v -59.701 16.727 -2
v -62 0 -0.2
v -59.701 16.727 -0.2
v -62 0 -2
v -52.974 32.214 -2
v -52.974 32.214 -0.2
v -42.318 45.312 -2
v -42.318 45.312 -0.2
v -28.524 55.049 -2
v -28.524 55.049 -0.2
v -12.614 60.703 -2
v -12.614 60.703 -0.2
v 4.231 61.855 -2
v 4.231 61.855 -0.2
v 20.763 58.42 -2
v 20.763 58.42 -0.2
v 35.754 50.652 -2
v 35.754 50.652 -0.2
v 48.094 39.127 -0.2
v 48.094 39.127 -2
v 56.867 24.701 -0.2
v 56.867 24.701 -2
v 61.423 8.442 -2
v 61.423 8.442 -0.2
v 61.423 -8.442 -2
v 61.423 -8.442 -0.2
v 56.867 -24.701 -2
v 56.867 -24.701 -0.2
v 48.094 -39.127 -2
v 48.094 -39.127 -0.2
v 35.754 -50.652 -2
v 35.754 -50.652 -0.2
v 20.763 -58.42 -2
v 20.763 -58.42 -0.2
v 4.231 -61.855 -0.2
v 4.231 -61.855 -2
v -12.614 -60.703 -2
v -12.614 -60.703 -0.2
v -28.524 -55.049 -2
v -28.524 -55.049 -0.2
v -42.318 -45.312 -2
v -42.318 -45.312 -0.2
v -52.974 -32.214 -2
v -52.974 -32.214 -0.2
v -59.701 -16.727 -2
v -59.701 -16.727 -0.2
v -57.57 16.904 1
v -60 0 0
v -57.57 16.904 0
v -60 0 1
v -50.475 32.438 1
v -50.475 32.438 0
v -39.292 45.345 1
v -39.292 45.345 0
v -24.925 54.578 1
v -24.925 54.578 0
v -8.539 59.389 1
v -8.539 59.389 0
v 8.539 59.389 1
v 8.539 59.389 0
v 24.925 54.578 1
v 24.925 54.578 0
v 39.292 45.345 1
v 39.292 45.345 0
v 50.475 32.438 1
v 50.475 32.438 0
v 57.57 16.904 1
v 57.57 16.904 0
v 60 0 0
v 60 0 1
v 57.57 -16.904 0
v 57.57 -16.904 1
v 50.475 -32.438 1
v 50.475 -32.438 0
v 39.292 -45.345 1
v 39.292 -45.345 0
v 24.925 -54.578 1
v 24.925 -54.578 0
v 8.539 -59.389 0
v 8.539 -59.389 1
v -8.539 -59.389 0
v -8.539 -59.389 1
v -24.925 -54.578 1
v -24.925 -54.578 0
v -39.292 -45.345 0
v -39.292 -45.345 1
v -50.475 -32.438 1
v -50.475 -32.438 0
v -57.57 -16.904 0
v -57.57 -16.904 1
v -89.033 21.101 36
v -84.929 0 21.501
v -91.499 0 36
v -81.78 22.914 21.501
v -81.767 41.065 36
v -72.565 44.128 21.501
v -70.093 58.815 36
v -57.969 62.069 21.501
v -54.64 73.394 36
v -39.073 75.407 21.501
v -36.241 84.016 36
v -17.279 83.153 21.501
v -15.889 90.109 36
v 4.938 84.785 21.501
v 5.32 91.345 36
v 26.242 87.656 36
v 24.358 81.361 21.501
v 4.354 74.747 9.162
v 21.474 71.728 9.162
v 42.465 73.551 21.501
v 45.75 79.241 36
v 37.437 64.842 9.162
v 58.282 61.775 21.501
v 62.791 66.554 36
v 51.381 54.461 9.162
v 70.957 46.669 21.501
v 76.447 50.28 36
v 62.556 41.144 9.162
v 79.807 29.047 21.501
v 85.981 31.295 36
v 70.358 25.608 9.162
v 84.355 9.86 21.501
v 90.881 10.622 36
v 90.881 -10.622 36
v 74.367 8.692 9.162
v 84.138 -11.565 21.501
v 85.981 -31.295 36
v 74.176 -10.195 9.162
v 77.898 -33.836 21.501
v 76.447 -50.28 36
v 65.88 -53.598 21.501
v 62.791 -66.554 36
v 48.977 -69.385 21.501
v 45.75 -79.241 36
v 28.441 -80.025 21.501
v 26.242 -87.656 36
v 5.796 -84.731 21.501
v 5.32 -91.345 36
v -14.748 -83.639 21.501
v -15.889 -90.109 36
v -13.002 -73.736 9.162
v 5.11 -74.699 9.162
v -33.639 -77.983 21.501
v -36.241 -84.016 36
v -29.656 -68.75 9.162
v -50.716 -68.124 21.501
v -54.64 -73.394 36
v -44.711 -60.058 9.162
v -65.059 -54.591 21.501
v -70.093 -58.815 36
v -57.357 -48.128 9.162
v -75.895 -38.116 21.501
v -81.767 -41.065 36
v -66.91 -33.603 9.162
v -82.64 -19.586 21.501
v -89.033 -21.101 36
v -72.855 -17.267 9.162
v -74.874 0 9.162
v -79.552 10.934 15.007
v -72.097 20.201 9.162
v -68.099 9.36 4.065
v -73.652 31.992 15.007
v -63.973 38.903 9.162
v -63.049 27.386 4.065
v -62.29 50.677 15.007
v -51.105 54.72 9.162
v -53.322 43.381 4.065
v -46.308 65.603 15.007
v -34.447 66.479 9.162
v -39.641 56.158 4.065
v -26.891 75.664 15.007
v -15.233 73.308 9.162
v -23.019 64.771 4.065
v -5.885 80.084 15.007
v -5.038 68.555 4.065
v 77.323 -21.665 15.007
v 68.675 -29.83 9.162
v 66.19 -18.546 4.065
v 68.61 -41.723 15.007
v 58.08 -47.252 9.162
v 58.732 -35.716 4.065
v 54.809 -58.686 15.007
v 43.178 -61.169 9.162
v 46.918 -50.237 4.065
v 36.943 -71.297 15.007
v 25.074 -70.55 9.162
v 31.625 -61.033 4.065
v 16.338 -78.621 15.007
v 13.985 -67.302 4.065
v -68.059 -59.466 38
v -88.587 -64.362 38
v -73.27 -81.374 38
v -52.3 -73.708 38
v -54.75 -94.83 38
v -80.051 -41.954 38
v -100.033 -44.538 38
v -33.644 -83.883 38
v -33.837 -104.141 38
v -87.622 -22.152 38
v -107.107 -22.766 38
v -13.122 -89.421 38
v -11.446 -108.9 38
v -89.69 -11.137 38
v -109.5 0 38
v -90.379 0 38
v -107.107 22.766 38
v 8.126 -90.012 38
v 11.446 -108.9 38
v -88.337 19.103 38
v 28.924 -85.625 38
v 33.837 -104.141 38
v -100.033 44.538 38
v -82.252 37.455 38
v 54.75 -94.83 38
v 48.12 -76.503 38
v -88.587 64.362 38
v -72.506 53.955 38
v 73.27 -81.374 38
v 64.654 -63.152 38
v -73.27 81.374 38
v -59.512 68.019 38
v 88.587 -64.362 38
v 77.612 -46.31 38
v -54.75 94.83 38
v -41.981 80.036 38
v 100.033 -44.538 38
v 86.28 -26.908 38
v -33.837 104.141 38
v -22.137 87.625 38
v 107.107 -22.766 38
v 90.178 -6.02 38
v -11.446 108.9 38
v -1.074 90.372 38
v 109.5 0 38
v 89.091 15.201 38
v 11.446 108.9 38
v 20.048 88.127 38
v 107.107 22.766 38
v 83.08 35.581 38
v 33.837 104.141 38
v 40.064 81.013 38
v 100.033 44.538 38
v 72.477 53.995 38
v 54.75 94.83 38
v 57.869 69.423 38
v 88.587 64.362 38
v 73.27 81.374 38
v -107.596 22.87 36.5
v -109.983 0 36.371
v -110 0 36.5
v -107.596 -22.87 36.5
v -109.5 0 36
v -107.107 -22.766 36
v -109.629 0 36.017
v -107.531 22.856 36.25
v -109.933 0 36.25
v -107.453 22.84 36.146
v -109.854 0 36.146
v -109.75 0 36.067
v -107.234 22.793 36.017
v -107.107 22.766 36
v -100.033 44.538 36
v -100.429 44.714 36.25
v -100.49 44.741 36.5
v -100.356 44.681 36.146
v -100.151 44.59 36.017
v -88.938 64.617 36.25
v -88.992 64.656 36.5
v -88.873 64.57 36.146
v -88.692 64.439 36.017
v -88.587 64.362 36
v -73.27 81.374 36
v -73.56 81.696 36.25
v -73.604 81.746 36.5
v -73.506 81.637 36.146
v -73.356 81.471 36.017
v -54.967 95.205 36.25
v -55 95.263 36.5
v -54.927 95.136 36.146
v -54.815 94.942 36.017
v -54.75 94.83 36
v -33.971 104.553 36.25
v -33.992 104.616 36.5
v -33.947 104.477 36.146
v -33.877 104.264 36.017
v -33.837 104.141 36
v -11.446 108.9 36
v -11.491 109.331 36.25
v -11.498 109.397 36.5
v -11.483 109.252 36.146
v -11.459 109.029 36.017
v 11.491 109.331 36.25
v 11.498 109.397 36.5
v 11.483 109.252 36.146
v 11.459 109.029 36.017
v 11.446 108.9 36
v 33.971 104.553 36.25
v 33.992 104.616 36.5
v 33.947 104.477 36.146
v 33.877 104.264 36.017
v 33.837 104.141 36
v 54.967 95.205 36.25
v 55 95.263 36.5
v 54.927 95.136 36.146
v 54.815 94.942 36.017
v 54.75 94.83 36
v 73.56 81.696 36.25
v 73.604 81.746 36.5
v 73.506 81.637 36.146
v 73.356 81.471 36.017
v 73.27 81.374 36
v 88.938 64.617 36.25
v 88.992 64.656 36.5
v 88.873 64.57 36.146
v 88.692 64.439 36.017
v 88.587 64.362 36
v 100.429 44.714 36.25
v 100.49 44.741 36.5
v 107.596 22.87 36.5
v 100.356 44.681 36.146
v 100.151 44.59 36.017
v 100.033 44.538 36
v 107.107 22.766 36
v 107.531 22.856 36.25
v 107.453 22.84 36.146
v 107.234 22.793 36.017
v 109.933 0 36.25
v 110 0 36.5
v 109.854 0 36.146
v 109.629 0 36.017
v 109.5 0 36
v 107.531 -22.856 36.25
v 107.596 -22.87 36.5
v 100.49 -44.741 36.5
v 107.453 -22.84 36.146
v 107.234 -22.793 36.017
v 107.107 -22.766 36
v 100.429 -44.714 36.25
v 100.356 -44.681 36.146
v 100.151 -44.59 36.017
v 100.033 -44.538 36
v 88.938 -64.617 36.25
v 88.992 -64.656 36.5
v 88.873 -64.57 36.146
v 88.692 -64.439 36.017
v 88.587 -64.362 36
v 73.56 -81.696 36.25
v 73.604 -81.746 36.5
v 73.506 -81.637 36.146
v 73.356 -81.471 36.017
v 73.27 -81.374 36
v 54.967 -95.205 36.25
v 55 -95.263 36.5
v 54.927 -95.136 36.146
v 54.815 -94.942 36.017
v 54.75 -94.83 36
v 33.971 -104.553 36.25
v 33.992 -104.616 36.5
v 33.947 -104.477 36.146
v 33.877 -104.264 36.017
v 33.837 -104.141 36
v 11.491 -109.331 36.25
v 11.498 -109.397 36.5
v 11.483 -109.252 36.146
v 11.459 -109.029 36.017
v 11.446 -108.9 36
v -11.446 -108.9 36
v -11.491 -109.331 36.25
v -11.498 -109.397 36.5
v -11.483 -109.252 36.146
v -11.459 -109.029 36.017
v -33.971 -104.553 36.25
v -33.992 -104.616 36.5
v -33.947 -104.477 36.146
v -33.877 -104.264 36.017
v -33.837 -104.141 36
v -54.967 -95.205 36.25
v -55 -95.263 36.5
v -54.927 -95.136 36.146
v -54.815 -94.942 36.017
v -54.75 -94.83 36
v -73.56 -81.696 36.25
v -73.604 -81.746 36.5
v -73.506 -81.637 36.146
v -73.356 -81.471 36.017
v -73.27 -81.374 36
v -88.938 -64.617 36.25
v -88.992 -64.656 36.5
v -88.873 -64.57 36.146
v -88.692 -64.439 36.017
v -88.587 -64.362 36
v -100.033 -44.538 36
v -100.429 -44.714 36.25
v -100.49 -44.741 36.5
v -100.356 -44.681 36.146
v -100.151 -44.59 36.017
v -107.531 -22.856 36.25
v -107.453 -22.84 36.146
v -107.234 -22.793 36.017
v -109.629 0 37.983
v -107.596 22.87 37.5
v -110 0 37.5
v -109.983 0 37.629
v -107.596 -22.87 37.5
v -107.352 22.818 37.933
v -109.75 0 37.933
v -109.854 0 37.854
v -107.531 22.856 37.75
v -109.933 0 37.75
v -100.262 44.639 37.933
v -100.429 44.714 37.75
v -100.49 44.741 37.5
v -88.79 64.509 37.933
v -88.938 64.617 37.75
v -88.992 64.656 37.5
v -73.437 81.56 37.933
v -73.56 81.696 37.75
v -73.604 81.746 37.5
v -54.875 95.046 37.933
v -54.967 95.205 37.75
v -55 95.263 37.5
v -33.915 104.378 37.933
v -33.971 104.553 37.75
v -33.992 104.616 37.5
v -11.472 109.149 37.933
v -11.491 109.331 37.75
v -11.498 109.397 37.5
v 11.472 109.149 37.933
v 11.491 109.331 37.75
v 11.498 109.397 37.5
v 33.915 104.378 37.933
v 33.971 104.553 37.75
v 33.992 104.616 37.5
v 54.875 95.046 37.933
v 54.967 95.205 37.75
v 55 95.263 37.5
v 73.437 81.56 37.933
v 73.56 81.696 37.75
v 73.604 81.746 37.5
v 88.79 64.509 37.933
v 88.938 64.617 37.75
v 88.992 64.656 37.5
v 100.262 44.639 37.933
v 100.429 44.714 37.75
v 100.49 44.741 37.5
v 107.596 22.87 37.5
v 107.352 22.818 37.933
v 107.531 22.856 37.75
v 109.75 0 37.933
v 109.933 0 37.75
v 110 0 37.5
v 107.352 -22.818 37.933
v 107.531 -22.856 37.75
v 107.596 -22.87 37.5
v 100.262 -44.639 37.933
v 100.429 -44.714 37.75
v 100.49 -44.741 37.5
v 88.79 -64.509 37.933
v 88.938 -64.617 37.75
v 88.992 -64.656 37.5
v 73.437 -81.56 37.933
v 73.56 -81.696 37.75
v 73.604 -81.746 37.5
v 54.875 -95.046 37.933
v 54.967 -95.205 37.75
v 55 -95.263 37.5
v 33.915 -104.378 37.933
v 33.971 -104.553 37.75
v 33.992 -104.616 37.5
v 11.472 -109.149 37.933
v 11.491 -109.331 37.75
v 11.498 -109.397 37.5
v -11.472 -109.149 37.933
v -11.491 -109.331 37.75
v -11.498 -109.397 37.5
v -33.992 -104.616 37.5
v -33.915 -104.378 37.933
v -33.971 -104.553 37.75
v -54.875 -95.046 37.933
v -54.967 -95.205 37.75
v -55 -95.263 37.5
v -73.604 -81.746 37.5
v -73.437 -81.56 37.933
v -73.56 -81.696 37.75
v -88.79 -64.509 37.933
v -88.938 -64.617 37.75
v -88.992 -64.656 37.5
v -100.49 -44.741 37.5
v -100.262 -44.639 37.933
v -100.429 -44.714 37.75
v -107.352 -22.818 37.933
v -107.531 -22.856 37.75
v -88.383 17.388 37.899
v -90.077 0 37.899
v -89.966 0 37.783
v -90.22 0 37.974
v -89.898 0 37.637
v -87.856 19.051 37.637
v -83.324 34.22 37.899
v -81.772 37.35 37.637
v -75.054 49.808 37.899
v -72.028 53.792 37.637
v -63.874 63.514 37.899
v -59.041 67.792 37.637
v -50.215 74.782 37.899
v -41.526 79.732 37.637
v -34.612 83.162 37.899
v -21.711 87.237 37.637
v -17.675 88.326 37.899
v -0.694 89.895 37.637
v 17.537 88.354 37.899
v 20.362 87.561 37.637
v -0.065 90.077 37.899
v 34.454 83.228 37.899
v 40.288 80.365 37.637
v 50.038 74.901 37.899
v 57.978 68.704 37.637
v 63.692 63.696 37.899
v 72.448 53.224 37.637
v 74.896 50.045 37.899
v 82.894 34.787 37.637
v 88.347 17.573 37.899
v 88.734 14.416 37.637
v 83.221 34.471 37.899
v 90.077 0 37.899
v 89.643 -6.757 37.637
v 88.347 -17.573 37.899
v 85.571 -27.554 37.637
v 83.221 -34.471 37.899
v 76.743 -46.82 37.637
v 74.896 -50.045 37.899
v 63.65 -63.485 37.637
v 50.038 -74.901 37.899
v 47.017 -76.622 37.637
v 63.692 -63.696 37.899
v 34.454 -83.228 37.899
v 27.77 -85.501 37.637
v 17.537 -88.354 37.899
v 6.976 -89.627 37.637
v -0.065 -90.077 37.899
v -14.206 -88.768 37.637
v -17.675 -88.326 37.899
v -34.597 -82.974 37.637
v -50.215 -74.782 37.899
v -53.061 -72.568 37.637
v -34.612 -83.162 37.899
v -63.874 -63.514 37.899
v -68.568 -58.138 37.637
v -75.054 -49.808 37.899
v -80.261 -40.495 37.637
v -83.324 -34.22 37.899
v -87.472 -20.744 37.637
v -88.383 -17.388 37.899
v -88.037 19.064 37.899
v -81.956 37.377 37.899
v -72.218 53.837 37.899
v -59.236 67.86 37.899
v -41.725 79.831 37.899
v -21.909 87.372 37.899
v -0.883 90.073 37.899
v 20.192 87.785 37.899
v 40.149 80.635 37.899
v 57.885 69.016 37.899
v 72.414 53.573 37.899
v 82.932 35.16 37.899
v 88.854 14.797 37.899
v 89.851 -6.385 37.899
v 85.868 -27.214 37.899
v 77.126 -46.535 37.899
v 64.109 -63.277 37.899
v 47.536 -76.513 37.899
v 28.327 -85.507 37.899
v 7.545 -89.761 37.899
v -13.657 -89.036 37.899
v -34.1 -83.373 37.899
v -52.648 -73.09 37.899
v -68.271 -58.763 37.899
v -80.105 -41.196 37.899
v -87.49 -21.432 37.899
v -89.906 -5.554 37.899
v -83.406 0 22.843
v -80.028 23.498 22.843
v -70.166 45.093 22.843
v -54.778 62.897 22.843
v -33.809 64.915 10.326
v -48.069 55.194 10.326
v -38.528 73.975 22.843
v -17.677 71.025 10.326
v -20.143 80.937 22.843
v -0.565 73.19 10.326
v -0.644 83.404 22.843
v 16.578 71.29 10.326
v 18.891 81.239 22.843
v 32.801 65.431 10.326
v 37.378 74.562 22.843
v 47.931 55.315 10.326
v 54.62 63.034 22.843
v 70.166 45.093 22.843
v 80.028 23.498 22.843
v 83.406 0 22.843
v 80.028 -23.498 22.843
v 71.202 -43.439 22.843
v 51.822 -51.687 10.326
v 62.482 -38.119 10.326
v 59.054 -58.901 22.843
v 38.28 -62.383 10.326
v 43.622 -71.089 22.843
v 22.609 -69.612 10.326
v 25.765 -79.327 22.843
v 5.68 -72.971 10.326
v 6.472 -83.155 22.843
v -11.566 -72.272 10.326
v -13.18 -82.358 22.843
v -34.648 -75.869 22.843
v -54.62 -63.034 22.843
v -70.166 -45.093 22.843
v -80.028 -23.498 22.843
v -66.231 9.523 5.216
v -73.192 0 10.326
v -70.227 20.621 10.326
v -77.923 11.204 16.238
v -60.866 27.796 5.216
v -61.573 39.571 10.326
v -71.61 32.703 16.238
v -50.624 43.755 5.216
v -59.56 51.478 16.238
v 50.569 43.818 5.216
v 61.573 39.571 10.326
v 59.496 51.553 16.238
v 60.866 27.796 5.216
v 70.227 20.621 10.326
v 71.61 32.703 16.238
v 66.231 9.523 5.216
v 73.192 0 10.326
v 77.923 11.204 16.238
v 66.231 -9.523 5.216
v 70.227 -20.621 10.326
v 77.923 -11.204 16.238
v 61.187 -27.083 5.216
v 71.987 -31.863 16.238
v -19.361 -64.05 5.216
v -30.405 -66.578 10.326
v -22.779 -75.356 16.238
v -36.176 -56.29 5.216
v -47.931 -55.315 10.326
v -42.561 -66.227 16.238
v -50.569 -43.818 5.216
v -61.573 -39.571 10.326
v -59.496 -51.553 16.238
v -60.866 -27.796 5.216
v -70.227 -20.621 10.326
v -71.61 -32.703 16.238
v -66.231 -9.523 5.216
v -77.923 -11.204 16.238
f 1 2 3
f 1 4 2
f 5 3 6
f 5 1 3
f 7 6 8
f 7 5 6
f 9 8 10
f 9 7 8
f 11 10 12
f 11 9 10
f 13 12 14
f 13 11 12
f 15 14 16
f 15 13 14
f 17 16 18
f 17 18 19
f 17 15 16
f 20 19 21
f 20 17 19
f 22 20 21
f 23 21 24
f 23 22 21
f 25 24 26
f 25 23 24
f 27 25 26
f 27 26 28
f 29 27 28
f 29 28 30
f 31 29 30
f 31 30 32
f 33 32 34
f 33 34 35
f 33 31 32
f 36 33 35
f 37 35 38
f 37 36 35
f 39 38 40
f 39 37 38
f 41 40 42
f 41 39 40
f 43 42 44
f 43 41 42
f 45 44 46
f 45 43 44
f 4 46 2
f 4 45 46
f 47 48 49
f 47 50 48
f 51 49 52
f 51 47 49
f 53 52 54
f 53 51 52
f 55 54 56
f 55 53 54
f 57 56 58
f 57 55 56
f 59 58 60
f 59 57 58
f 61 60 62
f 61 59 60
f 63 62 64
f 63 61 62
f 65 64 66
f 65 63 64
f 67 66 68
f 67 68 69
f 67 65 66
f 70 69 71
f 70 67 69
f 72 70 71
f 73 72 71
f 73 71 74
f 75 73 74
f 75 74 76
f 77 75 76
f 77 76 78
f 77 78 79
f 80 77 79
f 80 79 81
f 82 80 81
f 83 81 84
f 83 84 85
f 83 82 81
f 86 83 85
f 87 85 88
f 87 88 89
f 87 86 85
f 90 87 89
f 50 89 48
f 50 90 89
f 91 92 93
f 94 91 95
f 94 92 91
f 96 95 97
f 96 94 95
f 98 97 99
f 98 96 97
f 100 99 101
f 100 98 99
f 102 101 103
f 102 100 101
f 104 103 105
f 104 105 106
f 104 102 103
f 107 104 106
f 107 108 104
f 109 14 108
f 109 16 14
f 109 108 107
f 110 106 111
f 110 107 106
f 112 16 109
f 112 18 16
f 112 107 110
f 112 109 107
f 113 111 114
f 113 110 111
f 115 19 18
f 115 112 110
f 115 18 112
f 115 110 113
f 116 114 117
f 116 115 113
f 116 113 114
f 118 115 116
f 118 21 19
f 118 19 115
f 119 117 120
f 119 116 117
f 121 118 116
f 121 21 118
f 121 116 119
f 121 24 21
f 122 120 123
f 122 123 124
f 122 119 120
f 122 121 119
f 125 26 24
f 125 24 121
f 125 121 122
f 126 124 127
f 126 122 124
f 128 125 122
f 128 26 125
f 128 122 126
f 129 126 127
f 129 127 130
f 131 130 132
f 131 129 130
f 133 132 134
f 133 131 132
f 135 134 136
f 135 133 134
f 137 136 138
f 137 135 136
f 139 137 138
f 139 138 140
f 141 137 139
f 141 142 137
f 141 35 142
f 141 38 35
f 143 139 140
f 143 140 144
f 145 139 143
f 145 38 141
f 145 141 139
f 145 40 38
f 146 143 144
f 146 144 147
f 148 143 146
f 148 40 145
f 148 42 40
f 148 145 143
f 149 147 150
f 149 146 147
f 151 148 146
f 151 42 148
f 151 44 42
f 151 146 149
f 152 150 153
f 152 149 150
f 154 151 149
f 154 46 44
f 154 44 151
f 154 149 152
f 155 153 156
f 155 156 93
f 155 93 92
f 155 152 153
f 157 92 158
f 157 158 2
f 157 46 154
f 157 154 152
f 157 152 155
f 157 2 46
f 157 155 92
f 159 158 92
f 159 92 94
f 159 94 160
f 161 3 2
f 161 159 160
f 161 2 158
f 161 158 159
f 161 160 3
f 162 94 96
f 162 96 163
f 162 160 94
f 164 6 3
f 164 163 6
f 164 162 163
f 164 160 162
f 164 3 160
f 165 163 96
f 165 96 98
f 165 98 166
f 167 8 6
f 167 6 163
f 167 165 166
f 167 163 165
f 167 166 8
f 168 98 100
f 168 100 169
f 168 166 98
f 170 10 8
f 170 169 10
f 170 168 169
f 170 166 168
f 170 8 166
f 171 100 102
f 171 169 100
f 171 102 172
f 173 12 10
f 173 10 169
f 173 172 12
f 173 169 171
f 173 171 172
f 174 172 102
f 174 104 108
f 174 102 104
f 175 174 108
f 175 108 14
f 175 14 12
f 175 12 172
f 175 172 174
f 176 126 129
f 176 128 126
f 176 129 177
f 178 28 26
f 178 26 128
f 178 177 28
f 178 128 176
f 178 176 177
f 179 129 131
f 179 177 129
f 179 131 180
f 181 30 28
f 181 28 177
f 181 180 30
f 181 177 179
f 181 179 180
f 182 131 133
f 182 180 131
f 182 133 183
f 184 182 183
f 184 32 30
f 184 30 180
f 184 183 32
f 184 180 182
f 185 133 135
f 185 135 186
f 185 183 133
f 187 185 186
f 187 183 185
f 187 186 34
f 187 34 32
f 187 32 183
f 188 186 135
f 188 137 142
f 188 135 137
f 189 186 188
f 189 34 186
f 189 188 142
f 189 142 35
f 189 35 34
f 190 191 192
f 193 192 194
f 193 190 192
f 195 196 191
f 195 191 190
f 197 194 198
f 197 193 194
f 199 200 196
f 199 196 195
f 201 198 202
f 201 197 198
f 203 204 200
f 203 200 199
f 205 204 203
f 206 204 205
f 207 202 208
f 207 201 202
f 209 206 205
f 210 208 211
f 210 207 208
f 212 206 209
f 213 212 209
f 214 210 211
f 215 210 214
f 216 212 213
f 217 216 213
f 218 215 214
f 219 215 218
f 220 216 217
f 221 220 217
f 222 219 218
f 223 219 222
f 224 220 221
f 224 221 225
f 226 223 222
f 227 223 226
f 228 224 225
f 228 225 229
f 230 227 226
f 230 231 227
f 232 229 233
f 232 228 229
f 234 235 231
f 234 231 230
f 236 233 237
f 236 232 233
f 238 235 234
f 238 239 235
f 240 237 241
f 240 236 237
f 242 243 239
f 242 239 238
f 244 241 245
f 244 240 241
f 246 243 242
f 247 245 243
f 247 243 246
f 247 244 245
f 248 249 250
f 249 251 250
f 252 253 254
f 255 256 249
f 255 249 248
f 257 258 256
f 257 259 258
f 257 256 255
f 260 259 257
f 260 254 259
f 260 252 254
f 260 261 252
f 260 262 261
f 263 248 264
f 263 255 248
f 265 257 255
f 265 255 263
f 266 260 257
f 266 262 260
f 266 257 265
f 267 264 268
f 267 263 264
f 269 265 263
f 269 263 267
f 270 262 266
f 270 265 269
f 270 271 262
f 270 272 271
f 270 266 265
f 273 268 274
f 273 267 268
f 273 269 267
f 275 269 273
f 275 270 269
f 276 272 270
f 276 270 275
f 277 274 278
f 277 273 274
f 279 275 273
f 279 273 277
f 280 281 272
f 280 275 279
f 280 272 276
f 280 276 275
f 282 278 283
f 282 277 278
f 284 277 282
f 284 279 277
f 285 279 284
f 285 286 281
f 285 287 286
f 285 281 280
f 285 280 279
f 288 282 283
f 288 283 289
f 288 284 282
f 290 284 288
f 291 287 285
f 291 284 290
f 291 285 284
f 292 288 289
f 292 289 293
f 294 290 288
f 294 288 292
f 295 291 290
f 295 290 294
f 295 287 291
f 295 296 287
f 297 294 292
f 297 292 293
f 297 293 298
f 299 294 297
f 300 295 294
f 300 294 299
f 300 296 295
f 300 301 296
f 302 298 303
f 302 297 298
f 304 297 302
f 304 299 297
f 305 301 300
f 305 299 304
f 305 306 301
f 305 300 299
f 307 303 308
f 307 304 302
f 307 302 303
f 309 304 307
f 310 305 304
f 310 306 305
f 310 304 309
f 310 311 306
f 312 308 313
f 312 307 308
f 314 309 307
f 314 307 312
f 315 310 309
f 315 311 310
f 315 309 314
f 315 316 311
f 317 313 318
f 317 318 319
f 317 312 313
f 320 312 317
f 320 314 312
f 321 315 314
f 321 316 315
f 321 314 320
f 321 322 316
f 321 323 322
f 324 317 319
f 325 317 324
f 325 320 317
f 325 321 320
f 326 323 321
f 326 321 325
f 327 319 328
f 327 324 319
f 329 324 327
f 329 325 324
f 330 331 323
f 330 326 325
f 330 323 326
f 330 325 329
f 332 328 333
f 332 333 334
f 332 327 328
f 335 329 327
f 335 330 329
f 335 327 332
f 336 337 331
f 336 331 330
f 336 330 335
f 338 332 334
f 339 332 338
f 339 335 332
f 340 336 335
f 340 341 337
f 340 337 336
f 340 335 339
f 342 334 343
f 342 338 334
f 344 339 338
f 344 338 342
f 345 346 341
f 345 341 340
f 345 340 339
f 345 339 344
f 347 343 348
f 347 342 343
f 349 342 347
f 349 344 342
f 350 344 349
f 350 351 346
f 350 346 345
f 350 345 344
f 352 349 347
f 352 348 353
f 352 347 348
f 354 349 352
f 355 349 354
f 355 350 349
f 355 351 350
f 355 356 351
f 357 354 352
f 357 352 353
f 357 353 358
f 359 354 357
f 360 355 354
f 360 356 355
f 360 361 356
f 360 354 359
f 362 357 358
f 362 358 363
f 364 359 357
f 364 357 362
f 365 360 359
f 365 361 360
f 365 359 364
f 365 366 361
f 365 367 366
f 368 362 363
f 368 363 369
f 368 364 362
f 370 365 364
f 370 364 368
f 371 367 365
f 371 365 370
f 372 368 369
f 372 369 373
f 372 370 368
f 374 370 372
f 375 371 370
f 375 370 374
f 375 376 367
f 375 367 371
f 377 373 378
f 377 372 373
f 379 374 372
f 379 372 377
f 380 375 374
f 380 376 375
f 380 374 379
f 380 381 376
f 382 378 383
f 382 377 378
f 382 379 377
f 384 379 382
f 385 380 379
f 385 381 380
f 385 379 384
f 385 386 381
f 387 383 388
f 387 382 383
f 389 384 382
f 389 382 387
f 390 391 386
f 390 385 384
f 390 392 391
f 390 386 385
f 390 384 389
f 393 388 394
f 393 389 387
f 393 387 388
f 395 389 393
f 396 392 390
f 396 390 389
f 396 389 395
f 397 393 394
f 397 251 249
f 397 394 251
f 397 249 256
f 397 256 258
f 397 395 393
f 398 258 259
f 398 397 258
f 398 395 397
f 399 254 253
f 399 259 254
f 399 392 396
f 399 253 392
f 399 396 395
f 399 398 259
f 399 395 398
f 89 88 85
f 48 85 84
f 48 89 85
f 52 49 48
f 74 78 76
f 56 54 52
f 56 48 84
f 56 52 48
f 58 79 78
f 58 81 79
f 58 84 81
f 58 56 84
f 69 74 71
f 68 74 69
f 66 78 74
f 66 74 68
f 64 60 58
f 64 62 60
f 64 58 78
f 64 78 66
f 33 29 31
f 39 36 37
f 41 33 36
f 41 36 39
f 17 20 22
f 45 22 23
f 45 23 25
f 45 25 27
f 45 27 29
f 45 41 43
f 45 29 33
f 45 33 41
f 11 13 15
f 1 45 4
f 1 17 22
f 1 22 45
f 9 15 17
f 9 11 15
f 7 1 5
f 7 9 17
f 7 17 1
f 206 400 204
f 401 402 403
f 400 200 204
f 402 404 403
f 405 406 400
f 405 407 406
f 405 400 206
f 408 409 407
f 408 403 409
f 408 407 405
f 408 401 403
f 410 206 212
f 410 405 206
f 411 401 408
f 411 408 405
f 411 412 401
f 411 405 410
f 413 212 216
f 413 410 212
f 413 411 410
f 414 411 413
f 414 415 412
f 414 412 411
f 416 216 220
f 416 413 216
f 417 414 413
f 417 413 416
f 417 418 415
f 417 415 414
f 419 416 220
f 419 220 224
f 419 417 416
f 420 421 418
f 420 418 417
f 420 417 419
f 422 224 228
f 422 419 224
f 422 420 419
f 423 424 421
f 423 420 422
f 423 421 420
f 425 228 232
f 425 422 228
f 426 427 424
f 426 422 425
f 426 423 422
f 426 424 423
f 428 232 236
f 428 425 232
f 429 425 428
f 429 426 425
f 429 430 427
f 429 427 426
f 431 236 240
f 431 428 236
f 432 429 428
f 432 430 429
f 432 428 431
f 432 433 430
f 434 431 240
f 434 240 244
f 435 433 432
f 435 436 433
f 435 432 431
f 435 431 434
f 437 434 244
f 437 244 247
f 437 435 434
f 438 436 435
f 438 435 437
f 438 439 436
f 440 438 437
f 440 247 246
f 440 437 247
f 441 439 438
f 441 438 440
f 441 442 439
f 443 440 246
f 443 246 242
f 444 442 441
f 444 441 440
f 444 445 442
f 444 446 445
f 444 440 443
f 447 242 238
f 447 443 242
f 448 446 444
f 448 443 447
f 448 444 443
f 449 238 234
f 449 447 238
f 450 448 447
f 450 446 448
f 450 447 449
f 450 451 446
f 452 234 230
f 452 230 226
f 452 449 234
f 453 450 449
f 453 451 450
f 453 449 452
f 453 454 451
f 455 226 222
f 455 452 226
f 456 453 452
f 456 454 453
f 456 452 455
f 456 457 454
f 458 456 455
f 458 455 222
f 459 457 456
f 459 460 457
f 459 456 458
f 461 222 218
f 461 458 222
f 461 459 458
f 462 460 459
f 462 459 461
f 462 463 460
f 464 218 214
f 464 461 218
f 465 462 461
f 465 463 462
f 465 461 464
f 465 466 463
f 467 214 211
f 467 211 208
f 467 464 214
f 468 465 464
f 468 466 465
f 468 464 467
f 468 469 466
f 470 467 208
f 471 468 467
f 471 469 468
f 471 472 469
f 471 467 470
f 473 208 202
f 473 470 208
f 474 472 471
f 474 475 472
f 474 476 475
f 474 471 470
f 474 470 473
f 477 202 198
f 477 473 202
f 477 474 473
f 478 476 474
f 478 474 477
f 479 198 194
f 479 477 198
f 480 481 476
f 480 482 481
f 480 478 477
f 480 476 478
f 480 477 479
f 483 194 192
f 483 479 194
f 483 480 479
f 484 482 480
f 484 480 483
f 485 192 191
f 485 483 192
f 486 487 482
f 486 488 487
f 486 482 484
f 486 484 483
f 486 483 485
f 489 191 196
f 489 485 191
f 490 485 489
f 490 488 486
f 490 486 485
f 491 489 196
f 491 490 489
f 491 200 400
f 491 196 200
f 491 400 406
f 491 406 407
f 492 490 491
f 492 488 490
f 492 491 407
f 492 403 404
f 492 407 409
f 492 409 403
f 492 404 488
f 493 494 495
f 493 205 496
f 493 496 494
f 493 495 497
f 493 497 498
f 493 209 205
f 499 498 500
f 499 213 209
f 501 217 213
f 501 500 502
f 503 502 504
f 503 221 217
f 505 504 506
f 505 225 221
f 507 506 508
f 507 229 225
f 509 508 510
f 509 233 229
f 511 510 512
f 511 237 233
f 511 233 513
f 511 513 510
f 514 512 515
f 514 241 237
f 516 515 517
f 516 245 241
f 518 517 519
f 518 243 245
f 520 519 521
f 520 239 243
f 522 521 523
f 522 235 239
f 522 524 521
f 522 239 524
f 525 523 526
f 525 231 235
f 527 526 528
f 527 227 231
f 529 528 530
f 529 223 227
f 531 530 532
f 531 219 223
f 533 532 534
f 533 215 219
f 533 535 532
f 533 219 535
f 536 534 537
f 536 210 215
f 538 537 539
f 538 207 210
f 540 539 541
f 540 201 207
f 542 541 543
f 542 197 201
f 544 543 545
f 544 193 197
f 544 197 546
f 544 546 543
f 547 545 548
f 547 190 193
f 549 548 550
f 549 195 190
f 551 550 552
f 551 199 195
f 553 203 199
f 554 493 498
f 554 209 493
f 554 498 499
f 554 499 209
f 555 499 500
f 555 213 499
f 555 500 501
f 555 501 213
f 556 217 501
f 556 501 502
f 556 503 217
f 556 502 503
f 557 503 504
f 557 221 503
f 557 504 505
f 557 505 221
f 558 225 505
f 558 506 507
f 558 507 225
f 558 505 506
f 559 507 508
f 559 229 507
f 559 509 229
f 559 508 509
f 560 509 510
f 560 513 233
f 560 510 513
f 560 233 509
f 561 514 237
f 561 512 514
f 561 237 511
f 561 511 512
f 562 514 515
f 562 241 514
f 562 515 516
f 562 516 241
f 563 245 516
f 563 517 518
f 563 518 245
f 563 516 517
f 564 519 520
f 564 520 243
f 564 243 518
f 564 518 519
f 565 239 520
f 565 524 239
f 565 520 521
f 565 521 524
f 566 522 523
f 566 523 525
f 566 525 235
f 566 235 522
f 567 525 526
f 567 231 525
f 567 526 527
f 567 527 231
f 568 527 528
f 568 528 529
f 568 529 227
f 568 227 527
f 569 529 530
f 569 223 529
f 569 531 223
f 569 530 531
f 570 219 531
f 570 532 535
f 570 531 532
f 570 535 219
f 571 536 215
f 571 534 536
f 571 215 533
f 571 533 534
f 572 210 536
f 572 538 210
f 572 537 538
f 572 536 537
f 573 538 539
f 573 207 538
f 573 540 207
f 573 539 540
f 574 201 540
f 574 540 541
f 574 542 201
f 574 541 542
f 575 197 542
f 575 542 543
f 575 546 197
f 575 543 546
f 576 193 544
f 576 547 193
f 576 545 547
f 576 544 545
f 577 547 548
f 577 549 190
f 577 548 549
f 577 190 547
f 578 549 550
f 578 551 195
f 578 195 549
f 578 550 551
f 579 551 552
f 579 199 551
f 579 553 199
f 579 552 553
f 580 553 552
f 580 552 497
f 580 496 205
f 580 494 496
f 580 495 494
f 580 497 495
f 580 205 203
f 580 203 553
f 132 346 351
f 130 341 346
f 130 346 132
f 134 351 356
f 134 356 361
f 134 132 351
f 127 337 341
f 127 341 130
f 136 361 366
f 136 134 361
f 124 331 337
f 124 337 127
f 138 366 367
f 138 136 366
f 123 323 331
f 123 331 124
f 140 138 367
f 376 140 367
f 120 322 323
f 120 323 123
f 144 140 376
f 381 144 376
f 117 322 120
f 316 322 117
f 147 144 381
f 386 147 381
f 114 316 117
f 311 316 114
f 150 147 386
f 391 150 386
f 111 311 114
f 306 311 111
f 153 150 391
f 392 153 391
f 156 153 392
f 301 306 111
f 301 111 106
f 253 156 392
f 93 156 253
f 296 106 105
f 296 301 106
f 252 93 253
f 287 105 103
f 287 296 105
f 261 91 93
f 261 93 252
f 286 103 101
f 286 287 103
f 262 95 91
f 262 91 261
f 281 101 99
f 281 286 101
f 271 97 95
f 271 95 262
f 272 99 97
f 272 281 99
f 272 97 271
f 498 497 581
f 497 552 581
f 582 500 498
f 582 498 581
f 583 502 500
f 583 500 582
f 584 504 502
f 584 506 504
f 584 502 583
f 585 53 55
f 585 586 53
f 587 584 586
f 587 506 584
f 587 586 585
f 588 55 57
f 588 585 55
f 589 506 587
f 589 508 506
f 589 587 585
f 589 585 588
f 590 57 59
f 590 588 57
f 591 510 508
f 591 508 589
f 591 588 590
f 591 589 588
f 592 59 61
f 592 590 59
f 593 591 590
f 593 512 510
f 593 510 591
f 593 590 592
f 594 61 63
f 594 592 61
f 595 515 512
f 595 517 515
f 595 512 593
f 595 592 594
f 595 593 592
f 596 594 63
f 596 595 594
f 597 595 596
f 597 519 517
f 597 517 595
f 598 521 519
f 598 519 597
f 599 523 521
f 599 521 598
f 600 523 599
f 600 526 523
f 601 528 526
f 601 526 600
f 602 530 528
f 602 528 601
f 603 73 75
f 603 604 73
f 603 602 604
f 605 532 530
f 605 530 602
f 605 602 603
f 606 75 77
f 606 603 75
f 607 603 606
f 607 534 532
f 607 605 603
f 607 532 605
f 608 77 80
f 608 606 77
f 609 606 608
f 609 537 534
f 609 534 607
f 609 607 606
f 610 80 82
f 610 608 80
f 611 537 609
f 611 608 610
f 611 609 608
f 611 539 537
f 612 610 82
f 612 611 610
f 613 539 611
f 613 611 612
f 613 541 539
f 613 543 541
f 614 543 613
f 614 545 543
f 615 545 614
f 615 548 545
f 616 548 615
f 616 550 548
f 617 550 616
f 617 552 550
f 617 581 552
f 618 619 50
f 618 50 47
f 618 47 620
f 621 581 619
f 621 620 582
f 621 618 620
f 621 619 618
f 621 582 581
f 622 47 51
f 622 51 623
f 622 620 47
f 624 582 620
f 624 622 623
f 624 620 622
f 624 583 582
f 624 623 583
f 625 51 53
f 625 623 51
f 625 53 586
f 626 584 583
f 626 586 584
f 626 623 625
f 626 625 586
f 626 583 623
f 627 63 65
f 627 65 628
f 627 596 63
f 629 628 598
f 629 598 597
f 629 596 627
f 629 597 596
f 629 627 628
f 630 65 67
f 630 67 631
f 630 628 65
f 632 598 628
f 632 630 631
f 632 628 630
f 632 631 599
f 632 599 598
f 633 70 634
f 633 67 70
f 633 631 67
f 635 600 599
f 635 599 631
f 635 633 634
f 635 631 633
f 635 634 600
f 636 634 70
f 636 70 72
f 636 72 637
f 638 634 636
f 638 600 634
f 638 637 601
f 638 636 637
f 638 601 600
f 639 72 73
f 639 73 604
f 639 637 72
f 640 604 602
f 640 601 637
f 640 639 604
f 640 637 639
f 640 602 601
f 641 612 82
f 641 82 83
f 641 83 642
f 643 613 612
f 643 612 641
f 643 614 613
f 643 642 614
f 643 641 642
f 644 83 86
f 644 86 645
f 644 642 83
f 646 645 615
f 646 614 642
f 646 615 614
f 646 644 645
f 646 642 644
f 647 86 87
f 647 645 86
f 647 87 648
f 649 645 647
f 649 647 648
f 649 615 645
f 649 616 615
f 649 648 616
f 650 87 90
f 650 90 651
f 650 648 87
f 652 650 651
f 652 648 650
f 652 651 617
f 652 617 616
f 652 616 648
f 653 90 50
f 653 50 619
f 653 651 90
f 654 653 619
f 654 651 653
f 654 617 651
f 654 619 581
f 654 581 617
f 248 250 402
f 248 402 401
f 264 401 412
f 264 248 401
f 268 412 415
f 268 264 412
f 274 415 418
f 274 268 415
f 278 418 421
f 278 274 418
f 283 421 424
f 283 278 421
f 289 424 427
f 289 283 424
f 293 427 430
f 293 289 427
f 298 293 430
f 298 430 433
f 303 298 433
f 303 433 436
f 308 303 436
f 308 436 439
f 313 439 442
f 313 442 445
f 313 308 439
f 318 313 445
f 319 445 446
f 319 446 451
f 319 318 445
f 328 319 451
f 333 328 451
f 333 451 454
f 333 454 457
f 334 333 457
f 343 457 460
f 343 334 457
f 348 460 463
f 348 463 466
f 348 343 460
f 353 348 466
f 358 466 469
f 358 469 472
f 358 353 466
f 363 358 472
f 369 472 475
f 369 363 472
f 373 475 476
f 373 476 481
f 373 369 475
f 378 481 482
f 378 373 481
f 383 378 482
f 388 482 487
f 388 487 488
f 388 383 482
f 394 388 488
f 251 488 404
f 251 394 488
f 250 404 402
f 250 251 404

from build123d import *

# Parameters (mm, degrees)
F2_R = 0.5


with BuildPart() as f1:
    # F0 (on Front) → F1 (revolve)
    with BuildSketch(Plane.XZ):
        with BuildLine():
            Line((-90, 38), (-110, 38))
            Line((-110, 38), (-110, 36))
            Line((-110, 36), (-91.499485, 36))
            ThreePointArc((-91.499485, 36), (-80.300295, 15.006578), (-62, -0.200158))
            Line((-62, -0.200158), (-62, -2))
            Line((-62, -2), (0, -2))
            Line((0, -2), (0, 0))
            Line((0, 0), (-60, 0))
            Line((-60, 0), (-60, 1))
            ThreePointArc((-60, 1), (-78.842757, 16.384251), (-90, 38))
        make_face()
    revolve(axis=Axis((0, 0, -1), (0, 0, -1)))

    # F2
    f2_edges = [f1.edges().sort_by_distance(p)[0] for p in [
        (110, 0, 36),
        (110, 0, 38),
        (90, 0, 38),
    ]]
    fillet(f2_edges, radius=F2_R)


solid = f1.part
